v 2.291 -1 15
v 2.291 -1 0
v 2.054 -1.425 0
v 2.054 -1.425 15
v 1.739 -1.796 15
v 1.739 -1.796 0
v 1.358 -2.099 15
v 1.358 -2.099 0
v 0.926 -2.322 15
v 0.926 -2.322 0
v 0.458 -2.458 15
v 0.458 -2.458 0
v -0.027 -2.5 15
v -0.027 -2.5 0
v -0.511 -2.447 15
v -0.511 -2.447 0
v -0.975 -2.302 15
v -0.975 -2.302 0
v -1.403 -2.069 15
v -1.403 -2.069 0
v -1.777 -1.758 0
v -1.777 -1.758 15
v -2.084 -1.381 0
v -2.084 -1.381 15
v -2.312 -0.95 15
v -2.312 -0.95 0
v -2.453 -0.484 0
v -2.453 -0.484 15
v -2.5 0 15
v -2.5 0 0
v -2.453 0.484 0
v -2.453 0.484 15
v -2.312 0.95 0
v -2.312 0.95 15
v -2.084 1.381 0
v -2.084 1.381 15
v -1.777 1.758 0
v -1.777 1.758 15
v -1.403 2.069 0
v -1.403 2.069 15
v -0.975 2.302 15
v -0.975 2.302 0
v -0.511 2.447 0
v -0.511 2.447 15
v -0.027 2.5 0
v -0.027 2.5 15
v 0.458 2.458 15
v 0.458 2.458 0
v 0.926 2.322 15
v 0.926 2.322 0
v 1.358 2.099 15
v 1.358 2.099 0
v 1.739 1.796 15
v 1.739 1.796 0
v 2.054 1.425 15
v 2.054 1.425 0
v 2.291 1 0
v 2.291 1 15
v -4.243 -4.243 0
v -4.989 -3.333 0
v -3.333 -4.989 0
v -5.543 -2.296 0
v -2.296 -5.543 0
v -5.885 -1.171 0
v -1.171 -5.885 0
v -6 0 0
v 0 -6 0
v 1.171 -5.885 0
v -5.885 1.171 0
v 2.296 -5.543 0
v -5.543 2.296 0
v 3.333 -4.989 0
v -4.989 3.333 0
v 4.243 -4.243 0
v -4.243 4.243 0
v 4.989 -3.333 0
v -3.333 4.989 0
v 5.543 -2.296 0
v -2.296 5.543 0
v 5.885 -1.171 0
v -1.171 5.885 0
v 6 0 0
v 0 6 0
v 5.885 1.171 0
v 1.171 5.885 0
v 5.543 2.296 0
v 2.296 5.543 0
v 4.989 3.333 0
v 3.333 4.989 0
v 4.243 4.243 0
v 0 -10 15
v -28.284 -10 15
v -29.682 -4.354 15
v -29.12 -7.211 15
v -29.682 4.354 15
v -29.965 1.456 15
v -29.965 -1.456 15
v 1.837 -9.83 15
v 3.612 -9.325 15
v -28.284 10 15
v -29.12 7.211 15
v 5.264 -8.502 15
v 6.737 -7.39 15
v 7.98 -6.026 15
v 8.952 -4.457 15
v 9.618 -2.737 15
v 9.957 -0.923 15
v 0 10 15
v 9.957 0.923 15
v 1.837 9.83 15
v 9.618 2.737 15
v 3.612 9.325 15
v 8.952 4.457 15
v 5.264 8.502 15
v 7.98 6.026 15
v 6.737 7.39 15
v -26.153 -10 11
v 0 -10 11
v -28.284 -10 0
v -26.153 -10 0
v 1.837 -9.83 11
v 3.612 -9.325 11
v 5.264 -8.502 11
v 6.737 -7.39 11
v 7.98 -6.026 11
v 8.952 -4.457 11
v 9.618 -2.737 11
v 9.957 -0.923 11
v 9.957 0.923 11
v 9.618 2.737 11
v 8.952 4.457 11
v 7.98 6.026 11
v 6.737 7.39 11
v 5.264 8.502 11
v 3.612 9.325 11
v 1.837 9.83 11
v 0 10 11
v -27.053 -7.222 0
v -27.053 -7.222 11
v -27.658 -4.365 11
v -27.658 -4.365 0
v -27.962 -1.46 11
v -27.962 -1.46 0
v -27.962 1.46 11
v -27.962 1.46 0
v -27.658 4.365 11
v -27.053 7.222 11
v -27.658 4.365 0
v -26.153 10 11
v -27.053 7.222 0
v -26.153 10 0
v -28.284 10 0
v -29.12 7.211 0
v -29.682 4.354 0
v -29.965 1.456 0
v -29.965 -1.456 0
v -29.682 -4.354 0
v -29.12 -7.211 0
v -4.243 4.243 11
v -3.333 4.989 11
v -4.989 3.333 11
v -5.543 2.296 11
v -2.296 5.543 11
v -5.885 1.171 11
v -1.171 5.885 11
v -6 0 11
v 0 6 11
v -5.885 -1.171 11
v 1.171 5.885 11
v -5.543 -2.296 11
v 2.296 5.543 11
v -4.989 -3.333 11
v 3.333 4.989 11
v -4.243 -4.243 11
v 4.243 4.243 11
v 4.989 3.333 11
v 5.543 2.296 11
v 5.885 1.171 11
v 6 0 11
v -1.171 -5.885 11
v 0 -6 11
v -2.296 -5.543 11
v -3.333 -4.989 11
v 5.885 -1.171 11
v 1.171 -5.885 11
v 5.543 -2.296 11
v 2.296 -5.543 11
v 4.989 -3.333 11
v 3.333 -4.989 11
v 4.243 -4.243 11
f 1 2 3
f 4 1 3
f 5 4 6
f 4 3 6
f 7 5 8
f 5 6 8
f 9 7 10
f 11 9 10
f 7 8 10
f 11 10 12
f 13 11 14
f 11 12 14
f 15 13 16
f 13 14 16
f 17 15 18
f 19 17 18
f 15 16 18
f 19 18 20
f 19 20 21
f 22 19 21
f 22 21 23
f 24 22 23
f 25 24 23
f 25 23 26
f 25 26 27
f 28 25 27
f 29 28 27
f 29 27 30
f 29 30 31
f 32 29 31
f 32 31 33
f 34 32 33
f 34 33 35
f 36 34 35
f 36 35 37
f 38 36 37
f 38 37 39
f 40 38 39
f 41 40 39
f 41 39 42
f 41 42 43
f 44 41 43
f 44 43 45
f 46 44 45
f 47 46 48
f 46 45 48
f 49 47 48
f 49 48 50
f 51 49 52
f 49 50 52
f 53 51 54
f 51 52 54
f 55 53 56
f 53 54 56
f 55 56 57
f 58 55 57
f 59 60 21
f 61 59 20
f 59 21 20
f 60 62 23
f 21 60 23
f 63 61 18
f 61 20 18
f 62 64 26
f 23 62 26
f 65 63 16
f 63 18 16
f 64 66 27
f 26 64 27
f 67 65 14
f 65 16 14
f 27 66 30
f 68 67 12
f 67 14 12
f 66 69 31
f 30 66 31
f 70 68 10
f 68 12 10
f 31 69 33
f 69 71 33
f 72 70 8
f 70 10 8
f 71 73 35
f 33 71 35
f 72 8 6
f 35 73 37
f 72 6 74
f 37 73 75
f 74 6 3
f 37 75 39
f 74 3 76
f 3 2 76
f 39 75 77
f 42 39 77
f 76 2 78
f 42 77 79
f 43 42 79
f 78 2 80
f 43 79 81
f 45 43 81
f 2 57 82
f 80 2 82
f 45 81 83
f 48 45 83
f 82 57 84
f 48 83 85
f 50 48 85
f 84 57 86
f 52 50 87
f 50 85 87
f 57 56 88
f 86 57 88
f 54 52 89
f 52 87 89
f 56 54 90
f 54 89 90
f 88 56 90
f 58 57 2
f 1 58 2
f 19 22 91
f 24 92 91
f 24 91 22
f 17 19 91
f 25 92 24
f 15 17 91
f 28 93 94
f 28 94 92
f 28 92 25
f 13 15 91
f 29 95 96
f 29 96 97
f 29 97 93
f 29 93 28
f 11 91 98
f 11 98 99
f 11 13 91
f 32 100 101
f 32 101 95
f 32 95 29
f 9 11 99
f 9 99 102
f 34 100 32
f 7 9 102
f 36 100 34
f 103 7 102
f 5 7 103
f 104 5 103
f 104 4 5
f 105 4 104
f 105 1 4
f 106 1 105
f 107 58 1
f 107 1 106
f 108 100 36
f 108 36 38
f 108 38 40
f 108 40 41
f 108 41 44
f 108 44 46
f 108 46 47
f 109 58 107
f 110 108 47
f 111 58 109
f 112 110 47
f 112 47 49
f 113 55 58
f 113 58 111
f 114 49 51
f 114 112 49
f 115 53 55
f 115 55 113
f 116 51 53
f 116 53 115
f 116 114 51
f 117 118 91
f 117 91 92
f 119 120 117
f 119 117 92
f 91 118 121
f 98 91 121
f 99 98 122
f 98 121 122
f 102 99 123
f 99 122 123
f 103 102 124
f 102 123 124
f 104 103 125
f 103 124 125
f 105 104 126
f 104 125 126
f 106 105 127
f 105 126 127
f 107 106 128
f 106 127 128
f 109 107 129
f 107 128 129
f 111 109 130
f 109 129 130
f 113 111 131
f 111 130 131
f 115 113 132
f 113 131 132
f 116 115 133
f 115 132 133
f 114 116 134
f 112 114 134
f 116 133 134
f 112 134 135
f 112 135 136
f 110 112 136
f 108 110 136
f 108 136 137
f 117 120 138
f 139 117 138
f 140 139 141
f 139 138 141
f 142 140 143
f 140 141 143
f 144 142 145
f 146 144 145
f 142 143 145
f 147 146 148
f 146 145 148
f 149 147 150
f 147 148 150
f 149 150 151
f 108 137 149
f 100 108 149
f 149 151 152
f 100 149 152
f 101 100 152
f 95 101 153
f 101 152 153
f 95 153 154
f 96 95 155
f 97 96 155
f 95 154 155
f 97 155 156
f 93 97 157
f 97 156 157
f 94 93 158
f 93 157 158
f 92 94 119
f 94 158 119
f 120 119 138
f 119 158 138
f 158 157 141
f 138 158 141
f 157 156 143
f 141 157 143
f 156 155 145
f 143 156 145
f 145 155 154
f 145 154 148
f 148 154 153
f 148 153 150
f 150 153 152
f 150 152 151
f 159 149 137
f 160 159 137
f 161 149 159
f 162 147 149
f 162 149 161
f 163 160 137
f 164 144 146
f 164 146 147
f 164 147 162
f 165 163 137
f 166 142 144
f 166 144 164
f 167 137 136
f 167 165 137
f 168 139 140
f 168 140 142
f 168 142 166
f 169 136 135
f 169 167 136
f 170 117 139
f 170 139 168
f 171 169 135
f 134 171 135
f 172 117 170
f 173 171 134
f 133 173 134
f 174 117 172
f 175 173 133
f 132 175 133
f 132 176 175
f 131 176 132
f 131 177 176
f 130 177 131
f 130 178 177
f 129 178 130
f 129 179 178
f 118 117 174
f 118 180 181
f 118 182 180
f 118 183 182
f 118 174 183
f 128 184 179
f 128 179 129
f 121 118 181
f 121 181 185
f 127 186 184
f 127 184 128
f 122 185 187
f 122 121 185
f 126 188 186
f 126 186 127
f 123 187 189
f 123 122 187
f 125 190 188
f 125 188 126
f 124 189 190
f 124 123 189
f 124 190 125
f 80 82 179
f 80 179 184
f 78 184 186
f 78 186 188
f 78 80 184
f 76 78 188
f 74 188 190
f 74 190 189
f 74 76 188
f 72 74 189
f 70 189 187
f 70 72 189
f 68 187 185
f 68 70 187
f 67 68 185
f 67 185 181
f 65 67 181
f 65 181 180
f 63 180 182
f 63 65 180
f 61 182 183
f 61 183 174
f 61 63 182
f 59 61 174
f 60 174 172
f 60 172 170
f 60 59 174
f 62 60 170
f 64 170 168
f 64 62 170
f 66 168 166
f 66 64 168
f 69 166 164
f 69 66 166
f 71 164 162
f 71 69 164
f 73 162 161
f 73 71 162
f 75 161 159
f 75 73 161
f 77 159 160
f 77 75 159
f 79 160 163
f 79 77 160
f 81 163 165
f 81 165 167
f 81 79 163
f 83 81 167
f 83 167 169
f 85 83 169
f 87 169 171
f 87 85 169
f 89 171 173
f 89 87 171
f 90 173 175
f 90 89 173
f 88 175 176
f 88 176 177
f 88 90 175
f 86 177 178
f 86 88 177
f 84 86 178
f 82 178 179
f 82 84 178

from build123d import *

# Parameters (mm, degrees)
PAD001_DEPTH    = 15
SKETCH004_R     = 28
SKETCH004_R_2   = 6
POCKET001_DEPTH = 11
POCKET002_DEPTH = 15.001


with BuildPart() as part:
    # Sketch003 → Pad001 (new body)
    with BuildSketch(Plane.XY):
        with BuildLine():
            ThreePointArc((0, -10), (10, 0), (0, 10))
            Line((0, 10), (-28.284271, 10))
            ThreePointArc((-28.284271, 10), (-30, 0), (-28.284271, -10))
            Line((0, -10), (-28.284271, -10))
        make_face()
    extrude(amount=PAD001_DEPTH)

    # Sketch004 (on Face5 of Pad001) → Pocket001 (cut)
    with BuildSketch(Plane(origin=(0, 0, 0), x_dir=(1, 0, 0), z_dir=(0, 0, -1))):
        Circle(SKETCH004_R)
        Circle(SKETCH004_R_2, mode=Mode.SUBTRACT)
    extrude(amount=-POCKET001_DEPTH, mode=Mode.SUBTRACT)

    # Sketch005 (on Face10 of Pocket001) → Pocket002 (cut, through all)
    with BuildSketch(Plane(origin=(0, 0, 0), x_dir=(1, 0, 0), z_dir=(0, 0, -1))):
        with BuildLine():
            ThreePointArc((2.291288, 1), (-2.5, 0), (2.291288, -1))
            Line((2.291288, -1), (2.291288, 1))
        make_face()
    extrude(amount=-POCKET002_DEPTH, mode=Mode.SUBTRACT)


solid = part.part
